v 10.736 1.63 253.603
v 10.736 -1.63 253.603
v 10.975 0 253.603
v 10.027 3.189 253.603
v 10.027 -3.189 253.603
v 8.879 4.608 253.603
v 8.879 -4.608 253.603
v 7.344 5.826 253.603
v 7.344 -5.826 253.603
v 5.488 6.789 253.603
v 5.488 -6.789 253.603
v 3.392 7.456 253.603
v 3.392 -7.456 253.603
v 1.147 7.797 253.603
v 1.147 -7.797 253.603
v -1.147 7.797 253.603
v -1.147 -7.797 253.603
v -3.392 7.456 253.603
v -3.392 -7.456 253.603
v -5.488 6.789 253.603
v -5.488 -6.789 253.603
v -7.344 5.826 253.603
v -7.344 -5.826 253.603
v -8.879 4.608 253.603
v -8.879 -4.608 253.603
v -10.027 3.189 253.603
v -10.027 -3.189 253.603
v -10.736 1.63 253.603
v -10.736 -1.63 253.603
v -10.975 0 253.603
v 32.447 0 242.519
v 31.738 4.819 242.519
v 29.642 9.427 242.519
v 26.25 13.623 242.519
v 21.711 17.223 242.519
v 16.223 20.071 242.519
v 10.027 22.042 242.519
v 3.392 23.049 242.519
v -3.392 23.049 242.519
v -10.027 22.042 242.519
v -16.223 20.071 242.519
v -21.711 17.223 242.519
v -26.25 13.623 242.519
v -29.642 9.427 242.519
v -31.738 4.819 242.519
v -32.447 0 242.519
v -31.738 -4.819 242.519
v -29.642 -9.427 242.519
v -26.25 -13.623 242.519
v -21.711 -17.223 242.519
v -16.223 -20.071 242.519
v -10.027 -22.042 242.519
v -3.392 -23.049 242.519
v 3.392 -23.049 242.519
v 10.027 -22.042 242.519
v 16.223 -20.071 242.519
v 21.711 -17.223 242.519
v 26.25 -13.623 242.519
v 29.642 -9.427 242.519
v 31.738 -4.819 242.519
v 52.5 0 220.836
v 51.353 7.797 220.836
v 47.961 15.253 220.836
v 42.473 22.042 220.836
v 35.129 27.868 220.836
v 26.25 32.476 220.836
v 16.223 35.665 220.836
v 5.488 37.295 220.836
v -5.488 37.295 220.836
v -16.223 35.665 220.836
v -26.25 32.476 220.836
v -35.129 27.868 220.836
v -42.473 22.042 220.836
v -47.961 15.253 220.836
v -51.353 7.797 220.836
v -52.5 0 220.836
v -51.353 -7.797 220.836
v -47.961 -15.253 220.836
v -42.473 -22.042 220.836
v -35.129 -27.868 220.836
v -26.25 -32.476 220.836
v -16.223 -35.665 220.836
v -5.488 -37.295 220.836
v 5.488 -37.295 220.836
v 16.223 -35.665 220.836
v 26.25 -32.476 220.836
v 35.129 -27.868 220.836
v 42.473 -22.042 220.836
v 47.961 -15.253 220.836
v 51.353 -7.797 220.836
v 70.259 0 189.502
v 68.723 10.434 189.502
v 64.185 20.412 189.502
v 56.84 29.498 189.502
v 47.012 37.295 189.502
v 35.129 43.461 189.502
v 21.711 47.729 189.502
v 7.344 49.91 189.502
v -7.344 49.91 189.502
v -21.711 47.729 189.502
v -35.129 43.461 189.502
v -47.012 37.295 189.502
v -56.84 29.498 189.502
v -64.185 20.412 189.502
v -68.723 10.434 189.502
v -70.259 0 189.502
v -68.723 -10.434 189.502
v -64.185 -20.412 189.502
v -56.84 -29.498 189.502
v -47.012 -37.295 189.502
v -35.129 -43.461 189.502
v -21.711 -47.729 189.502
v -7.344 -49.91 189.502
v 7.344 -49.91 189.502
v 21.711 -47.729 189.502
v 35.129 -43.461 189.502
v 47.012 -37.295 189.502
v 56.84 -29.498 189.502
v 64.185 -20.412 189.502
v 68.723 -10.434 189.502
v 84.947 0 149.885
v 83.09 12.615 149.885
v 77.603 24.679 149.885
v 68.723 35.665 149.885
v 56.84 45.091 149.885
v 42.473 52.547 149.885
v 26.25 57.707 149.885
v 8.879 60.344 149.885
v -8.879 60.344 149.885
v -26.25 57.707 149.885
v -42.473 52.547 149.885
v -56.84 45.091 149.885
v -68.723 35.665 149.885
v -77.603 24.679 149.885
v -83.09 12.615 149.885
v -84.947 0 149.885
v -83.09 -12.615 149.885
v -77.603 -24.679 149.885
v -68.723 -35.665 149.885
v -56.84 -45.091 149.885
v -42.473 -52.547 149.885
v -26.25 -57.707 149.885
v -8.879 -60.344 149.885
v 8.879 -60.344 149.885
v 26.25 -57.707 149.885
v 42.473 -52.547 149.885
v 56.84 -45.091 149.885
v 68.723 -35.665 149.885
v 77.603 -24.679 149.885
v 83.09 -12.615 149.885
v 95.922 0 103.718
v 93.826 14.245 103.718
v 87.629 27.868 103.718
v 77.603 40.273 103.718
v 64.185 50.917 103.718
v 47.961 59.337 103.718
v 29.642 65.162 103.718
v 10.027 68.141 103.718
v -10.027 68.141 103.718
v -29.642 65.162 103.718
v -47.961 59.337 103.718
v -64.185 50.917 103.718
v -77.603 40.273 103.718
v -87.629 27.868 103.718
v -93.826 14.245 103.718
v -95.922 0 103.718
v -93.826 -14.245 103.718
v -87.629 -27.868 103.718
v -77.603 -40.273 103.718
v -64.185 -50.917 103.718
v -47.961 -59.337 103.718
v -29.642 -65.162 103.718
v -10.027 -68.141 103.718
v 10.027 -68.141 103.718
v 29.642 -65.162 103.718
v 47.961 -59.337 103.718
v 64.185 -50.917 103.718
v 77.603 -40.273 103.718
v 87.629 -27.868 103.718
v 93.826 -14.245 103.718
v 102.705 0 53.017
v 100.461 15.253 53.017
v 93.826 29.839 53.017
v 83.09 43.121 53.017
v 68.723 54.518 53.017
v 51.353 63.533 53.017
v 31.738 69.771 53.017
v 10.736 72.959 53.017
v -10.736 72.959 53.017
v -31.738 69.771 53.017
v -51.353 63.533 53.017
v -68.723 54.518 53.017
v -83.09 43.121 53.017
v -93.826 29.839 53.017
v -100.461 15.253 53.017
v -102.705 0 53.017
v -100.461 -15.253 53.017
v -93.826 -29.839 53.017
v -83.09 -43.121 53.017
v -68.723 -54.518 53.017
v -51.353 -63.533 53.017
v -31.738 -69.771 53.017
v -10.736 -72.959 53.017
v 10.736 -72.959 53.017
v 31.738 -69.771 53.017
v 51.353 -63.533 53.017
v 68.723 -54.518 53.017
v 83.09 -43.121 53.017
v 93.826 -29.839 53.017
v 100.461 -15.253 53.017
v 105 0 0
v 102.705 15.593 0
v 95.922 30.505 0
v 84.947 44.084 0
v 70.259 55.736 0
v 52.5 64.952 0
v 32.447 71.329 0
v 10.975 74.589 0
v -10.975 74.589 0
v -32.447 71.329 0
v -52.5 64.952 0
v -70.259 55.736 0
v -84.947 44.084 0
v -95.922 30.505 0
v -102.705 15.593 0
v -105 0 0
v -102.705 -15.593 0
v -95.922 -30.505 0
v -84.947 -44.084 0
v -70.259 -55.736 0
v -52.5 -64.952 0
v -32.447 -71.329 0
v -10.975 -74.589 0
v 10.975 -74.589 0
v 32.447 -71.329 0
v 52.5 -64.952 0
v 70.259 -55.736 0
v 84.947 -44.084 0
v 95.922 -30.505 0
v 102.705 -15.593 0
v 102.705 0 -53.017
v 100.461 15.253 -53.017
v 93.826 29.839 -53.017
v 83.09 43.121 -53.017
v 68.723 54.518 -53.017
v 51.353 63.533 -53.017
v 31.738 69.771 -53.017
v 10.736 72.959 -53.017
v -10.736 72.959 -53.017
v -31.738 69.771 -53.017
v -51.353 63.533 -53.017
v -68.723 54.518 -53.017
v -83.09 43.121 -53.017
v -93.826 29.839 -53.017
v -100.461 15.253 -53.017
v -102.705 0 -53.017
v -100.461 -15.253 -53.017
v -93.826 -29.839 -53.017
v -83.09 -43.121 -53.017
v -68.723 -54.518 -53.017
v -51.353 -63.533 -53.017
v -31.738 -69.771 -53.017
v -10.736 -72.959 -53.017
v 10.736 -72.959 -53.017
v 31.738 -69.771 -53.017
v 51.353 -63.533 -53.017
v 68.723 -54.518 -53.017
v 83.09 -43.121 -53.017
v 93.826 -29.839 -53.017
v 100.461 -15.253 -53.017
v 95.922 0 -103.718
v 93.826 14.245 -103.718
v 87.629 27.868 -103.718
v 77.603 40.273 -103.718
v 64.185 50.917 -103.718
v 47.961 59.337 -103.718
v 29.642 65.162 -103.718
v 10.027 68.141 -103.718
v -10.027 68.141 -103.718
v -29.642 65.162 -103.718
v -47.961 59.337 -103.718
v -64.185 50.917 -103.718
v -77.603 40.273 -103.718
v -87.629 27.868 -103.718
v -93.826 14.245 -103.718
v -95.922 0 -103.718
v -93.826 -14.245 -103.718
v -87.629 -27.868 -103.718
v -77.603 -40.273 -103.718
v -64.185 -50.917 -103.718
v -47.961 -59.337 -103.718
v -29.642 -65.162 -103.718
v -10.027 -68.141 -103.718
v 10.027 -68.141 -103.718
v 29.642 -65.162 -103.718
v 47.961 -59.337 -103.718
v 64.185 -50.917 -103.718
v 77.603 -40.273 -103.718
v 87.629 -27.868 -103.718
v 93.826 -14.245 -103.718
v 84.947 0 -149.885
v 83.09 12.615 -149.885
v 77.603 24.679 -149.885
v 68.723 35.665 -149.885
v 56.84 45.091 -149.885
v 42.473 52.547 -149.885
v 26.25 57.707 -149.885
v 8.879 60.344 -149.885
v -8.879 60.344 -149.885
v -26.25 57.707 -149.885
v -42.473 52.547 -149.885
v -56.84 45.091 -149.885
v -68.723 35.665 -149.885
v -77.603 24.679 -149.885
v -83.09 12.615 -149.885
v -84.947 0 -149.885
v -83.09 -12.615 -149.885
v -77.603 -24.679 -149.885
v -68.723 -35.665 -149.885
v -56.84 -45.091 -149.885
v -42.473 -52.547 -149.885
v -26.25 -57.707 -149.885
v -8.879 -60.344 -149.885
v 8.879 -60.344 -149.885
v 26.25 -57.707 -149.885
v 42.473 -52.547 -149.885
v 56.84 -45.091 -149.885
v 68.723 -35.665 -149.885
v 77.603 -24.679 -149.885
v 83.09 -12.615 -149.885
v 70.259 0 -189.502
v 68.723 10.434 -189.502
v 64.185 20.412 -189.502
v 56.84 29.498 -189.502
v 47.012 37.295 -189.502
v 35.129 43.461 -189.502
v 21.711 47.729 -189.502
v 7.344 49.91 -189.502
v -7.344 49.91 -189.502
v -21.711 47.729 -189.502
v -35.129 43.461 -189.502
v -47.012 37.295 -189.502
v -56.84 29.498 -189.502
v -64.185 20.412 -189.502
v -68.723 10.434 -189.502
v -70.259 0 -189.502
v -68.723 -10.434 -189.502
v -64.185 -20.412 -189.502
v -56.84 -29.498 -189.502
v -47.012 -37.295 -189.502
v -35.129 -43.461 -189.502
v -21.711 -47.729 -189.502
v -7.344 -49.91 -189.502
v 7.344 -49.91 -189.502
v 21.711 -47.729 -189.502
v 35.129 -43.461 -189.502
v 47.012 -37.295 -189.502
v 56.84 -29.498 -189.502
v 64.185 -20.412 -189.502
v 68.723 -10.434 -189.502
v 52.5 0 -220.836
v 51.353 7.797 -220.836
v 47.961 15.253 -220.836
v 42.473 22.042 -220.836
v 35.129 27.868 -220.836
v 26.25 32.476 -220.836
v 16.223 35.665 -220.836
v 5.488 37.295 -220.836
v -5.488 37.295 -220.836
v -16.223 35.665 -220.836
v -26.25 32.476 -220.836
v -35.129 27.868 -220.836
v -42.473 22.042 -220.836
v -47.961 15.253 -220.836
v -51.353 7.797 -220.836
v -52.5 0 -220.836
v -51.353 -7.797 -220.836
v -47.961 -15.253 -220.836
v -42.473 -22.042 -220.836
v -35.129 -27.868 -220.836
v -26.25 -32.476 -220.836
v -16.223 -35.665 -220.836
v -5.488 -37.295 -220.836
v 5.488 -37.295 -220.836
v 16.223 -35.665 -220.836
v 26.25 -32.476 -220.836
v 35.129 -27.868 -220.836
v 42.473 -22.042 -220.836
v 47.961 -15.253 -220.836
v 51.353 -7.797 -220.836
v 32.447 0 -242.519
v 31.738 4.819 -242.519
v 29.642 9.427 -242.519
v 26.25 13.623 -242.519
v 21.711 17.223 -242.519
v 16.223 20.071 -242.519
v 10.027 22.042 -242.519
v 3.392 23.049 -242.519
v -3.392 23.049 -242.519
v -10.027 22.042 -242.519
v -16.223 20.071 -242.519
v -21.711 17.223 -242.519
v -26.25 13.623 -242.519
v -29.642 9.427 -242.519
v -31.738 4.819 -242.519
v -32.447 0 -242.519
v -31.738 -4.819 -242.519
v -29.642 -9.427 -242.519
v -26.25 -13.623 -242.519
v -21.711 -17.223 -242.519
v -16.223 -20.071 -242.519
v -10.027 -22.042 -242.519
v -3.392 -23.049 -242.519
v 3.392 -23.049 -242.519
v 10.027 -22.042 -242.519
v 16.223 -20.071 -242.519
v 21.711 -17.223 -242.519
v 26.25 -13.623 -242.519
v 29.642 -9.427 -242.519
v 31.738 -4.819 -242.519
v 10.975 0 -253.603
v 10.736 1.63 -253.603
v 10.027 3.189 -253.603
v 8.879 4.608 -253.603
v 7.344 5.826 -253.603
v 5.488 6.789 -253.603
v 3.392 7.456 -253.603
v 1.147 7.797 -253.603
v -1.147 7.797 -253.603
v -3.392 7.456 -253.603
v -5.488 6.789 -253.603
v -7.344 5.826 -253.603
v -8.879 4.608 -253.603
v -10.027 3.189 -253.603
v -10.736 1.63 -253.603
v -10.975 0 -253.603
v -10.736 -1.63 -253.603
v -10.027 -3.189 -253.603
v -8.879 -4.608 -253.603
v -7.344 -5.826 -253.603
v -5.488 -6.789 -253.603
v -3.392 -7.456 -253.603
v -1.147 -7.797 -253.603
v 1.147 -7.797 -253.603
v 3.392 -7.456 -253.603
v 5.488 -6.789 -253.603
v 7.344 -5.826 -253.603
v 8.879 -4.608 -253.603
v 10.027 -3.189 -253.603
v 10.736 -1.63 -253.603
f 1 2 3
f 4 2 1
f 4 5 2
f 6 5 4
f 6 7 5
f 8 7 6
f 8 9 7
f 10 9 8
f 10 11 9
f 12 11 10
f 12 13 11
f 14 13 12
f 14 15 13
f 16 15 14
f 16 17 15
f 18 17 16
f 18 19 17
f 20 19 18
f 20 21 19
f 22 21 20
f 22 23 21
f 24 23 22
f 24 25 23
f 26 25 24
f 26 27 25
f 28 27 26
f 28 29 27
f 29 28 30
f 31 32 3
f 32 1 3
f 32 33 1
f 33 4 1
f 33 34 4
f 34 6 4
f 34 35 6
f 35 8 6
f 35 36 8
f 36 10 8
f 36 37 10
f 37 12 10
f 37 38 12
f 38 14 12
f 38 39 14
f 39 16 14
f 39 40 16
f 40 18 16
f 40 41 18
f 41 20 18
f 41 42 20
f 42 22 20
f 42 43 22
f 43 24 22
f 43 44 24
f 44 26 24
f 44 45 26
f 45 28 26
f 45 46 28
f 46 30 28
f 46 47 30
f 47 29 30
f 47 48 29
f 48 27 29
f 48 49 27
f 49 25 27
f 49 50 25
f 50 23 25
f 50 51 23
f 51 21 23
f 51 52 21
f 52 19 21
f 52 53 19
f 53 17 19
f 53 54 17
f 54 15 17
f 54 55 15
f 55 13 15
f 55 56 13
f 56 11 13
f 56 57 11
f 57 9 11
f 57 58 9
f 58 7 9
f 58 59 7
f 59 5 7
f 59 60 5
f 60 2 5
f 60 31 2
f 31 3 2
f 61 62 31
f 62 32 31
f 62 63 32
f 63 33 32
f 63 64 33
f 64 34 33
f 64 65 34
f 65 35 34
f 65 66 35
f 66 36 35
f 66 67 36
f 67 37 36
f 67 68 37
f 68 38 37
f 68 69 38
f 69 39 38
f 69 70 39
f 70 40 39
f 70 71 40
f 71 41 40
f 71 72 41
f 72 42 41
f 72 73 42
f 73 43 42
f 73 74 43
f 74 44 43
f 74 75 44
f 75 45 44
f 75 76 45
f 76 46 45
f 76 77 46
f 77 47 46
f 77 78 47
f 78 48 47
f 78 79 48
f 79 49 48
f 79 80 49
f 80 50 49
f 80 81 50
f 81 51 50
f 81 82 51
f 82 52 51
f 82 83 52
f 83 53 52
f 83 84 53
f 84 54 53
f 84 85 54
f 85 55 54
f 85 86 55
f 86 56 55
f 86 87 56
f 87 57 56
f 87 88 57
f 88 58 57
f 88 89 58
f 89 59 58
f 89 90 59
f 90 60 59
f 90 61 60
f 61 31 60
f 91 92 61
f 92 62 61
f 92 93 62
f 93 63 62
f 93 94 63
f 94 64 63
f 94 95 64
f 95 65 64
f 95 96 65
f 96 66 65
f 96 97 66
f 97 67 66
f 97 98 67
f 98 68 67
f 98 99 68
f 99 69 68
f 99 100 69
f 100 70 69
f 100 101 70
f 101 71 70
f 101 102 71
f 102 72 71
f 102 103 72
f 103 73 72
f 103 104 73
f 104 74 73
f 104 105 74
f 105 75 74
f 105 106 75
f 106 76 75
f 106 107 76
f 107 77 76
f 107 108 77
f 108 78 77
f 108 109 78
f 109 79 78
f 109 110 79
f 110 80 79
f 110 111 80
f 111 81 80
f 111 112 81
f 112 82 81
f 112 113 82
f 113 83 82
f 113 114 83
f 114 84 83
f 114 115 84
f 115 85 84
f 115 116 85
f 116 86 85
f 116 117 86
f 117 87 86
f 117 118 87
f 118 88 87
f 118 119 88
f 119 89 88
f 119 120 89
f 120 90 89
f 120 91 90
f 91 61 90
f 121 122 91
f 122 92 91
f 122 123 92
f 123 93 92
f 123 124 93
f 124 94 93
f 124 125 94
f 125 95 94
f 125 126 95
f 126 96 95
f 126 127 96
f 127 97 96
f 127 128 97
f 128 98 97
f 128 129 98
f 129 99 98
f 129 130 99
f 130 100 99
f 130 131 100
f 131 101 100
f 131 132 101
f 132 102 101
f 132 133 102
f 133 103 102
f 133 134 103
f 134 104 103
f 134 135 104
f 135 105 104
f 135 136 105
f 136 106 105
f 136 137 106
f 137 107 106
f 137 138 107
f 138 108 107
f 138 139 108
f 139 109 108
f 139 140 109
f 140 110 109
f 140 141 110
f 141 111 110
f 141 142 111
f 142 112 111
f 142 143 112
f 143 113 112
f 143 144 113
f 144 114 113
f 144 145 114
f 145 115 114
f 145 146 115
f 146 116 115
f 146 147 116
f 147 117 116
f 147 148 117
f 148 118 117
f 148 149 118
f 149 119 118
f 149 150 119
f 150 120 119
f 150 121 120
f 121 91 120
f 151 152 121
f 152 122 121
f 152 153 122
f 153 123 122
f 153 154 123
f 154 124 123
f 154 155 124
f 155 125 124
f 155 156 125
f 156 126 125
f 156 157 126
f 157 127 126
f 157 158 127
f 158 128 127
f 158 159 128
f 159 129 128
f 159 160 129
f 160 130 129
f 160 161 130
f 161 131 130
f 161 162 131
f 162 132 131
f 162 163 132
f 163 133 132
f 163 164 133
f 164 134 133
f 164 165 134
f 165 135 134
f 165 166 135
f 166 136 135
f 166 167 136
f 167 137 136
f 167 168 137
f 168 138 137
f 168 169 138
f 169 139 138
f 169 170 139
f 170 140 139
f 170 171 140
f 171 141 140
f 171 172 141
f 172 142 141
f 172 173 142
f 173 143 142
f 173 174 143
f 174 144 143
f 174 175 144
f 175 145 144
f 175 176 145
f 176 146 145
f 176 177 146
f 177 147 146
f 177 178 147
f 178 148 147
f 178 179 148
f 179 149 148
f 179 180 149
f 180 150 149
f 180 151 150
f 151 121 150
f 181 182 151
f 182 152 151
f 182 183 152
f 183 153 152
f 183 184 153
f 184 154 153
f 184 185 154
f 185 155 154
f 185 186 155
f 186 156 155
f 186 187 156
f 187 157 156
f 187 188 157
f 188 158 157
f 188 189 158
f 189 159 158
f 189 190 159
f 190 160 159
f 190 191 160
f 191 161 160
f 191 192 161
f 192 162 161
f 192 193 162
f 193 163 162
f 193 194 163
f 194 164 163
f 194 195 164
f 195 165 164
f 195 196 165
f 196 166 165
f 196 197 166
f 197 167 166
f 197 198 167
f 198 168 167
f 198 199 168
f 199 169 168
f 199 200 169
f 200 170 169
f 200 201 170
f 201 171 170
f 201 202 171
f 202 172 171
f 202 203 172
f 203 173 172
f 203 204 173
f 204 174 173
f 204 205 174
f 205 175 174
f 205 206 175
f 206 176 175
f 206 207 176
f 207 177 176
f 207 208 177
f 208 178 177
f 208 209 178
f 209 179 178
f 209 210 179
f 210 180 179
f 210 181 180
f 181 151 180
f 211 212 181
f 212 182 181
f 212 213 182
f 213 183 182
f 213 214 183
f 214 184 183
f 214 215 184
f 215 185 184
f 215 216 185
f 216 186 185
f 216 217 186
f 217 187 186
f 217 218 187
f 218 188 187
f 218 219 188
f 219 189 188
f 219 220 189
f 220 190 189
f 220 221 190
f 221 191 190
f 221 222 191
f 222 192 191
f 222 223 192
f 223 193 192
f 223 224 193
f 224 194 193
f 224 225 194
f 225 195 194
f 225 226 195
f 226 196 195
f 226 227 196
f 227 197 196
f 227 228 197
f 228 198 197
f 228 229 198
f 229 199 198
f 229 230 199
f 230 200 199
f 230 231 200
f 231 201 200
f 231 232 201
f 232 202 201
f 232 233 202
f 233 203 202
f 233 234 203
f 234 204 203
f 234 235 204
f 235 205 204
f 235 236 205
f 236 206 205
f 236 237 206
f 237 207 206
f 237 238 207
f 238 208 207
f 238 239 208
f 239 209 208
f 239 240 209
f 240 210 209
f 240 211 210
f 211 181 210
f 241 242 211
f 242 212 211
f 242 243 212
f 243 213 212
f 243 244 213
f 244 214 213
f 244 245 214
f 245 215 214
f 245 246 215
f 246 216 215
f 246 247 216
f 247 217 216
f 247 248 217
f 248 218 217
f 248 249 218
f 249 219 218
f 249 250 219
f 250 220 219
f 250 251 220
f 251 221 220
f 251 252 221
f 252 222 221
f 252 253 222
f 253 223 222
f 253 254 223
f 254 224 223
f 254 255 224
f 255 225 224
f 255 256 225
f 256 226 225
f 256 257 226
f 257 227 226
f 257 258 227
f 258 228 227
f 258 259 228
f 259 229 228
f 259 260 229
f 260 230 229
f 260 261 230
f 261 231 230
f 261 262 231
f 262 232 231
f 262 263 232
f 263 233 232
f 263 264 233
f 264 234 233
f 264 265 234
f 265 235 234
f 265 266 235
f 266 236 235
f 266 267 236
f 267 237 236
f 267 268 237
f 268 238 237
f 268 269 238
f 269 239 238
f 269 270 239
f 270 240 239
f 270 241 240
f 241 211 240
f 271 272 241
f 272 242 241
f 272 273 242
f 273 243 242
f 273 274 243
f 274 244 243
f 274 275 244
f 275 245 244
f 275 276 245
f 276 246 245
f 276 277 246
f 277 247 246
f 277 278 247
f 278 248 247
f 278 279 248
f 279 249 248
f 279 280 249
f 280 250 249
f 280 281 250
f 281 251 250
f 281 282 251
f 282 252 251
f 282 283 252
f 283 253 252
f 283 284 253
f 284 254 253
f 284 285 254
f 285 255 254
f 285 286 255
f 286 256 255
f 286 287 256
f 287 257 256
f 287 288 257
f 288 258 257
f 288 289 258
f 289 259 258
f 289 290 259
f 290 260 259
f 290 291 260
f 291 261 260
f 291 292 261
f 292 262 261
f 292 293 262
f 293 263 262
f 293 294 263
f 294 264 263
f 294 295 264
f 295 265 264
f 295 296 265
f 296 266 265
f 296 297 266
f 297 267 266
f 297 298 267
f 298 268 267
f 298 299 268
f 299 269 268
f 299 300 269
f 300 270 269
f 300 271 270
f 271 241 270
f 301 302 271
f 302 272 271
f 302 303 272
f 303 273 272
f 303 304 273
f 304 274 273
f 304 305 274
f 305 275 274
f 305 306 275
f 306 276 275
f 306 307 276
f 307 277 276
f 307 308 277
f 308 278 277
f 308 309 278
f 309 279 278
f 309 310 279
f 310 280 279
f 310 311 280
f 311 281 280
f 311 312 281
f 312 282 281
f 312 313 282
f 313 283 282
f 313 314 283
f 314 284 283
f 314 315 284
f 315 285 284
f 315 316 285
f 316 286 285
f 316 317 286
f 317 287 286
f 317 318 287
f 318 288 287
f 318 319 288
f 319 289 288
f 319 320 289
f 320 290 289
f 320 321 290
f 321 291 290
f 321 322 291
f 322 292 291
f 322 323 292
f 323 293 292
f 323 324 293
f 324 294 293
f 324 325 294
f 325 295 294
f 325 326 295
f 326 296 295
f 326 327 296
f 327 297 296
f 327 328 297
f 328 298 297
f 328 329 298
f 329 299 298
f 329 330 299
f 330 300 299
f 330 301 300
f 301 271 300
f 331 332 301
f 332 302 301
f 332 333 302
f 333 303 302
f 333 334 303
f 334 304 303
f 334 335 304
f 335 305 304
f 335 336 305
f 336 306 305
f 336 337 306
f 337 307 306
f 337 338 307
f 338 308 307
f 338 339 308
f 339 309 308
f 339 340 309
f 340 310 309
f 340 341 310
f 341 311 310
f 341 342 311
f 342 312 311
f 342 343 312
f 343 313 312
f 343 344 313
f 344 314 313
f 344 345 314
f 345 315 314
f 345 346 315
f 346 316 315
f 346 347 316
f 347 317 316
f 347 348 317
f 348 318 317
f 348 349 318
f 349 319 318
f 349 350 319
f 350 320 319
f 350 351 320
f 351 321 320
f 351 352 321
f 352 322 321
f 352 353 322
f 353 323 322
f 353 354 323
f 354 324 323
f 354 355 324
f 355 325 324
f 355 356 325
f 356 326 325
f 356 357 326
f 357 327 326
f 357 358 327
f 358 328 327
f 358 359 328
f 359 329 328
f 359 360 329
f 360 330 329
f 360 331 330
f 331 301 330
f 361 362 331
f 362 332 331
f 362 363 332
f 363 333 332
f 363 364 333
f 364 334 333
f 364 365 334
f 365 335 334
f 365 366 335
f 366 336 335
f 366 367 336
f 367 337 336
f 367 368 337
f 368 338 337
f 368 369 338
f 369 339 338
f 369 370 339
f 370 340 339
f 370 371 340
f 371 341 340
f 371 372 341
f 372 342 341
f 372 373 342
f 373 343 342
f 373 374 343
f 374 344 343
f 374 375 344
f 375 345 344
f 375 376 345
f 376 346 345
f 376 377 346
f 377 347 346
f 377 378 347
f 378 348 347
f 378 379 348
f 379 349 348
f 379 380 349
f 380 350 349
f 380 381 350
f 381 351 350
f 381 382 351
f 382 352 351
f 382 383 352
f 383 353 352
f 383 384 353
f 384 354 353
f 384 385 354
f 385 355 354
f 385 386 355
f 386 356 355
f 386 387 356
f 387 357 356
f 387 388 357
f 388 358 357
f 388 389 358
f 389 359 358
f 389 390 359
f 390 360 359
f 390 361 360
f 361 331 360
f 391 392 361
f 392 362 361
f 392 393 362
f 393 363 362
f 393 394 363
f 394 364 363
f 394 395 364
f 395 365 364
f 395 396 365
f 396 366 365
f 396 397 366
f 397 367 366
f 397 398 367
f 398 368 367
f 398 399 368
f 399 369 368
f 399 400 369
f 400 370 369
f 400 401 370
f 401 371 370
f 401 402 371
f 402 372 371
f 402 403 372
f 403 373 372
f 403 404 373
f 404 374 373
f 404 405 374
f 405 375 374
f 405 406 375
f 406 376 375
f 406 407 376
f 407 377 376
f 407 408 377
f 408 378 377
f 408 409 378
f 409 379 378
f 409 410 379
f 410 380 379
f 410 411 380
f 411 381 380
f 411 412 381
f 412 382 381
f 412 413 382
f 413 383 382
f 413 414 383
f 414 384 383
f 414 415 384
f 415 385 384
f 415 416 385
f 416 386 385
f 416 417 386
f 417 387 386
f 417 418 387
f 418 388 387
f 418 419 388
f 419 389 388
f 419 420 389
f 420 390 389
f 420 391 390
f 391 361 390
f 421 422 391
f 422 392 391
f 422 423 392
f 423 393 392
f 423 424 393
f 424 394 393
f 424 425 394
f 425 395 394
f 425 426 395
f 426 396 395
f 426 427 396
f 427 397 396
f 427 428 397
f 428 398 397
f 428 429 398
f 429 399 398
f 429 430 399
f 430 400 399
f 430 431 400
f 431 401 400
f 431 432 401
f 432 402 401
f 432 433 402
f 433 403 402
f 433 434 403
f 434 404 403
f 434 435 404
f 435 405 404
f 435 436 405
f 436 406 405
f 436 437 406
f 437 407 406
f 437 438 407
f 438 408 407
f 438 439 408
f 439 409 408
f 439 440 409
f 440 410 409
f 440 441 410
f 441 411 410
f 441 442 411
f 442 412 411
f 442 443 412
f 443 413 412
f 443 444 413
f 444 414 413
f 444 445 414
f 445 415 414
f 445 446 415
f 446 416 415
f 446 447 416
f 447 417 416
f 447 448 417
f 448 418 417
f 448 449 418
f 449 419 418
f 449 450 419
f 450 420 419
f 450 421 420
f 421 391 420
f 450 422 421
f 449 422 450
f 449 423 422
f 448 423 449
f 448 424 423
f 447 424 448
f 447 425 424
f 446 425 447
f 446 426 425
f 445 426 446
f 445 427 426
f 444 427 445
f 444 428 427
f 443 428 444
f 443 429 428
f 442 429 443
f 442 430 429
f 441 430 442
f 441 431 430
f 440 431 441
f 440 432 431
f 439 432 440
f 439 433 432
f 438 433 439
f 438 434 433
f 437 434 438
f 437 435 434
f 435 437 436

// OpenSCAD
// Generated by SolidPython 1.0.1 on 2020-07-29 00:46:47


scale(v = [7, 5, 17]) {
	sphere(r = 15);
}
/***********************************************
*********      SolidPython code:      **********
************************************************
 
# import packages: SolidPython
from solid import *
from solid.utils import *
from itertools import chain, combinations, permutations


class Resize:

    def __init__(self, scad_file):
        self.scad_file = scad_file
        #self.scad_file = import_scad(scad_file)
        # cone/cylinder param:
        self.r1 = 0
        self.r2 = 0
        self.h = 0
        # rectangular prism param:
        self.w = 0
        self.l = 0
        # ellipse param:
        self.r = 0

    # import OpenScad code (file name corresponds to shape)


    # classify shape + parameters
    def assign(self, param1, param2, param3):
        if self.scad_file == 'cone.scad':
            self.r1 = param1
            self.r2 = param2
            self.h = param3
        elif self.scad_file == 'cylinder.scad':
            self.r1 = param1
            self.r2 = param2
            self.h = param3
        elif self.scad_file == 'rectangularPrism.scad':
            self.h = param1
            self.l = param2
            self.w = param3
        else:
            self.r = param1
            self.h = param2

    # resize parameters
    def iterate(self):
        x = range(3, 20, 2)
        i = 1
        if self.scad_file == 'cone.scad':
            tempList = list(permutations(x, 2))
            for temp in tempList:
                param1 = temp[0]
                param2 = temp[1]
                filepath = 'produced_scad_files/' + 'cone' + str(param1) + '_' + str(param2) + '_' + '.scad'
                scad_render_to_file(cylinder(h=param1, r1=param2, r2=0), filepath)

        elif self.scad_file == 'cylinder.scad':
            tempList = list(permutations(x, 3))
            for temp in tempList:
                param1 = temp[0]
                param2 = temp[1]
                filepath = 'produced_scad_files/' + 'cylinder' + str(param1) + '_' + str(param2) + '_' + '.scad'
                scad_render_to_file(cylinder(h=param1, r1=param2, r2=param2), filepath)

        elif self.scad_file == 'rectangularPrism.scad':
            tempList = list(permutations(x, 3))
            for temp in tempList:
                param1 = temp[0]
                param2 = temp[1]
                param3 = temp[2]
                filepath = 'produced_scad_files/' + 'rectangularPrism' + str(param1) + '_' + str(param2) + '_' + str(
                    param3) + '.scad'
                scad_render_to_file(cube(size=(param1, param2, param3)), filepath)

        elif self.scad_file == 'ellipse.scad':
            tempList = list(permutations(x, 4))
            for temp in tempList:
                param1 = temp[0]
                param2 = temp[1]
                param3 = temp[2]
                param4 = temp[3]
                filepath = 'produced_scad_files/' + 'ellipse' + str(param1) + '_' + str(param2) + '_' + str(param3) + '_' + str(param4) + '.scad'
                scad_render_to_file(scale([param1, param2, param3])(sphere(r=param4)), filepath)

    def render_to_scadfile(self):
        scad_render_to_file(scad, 'example.scad') 
 
************************************************/
